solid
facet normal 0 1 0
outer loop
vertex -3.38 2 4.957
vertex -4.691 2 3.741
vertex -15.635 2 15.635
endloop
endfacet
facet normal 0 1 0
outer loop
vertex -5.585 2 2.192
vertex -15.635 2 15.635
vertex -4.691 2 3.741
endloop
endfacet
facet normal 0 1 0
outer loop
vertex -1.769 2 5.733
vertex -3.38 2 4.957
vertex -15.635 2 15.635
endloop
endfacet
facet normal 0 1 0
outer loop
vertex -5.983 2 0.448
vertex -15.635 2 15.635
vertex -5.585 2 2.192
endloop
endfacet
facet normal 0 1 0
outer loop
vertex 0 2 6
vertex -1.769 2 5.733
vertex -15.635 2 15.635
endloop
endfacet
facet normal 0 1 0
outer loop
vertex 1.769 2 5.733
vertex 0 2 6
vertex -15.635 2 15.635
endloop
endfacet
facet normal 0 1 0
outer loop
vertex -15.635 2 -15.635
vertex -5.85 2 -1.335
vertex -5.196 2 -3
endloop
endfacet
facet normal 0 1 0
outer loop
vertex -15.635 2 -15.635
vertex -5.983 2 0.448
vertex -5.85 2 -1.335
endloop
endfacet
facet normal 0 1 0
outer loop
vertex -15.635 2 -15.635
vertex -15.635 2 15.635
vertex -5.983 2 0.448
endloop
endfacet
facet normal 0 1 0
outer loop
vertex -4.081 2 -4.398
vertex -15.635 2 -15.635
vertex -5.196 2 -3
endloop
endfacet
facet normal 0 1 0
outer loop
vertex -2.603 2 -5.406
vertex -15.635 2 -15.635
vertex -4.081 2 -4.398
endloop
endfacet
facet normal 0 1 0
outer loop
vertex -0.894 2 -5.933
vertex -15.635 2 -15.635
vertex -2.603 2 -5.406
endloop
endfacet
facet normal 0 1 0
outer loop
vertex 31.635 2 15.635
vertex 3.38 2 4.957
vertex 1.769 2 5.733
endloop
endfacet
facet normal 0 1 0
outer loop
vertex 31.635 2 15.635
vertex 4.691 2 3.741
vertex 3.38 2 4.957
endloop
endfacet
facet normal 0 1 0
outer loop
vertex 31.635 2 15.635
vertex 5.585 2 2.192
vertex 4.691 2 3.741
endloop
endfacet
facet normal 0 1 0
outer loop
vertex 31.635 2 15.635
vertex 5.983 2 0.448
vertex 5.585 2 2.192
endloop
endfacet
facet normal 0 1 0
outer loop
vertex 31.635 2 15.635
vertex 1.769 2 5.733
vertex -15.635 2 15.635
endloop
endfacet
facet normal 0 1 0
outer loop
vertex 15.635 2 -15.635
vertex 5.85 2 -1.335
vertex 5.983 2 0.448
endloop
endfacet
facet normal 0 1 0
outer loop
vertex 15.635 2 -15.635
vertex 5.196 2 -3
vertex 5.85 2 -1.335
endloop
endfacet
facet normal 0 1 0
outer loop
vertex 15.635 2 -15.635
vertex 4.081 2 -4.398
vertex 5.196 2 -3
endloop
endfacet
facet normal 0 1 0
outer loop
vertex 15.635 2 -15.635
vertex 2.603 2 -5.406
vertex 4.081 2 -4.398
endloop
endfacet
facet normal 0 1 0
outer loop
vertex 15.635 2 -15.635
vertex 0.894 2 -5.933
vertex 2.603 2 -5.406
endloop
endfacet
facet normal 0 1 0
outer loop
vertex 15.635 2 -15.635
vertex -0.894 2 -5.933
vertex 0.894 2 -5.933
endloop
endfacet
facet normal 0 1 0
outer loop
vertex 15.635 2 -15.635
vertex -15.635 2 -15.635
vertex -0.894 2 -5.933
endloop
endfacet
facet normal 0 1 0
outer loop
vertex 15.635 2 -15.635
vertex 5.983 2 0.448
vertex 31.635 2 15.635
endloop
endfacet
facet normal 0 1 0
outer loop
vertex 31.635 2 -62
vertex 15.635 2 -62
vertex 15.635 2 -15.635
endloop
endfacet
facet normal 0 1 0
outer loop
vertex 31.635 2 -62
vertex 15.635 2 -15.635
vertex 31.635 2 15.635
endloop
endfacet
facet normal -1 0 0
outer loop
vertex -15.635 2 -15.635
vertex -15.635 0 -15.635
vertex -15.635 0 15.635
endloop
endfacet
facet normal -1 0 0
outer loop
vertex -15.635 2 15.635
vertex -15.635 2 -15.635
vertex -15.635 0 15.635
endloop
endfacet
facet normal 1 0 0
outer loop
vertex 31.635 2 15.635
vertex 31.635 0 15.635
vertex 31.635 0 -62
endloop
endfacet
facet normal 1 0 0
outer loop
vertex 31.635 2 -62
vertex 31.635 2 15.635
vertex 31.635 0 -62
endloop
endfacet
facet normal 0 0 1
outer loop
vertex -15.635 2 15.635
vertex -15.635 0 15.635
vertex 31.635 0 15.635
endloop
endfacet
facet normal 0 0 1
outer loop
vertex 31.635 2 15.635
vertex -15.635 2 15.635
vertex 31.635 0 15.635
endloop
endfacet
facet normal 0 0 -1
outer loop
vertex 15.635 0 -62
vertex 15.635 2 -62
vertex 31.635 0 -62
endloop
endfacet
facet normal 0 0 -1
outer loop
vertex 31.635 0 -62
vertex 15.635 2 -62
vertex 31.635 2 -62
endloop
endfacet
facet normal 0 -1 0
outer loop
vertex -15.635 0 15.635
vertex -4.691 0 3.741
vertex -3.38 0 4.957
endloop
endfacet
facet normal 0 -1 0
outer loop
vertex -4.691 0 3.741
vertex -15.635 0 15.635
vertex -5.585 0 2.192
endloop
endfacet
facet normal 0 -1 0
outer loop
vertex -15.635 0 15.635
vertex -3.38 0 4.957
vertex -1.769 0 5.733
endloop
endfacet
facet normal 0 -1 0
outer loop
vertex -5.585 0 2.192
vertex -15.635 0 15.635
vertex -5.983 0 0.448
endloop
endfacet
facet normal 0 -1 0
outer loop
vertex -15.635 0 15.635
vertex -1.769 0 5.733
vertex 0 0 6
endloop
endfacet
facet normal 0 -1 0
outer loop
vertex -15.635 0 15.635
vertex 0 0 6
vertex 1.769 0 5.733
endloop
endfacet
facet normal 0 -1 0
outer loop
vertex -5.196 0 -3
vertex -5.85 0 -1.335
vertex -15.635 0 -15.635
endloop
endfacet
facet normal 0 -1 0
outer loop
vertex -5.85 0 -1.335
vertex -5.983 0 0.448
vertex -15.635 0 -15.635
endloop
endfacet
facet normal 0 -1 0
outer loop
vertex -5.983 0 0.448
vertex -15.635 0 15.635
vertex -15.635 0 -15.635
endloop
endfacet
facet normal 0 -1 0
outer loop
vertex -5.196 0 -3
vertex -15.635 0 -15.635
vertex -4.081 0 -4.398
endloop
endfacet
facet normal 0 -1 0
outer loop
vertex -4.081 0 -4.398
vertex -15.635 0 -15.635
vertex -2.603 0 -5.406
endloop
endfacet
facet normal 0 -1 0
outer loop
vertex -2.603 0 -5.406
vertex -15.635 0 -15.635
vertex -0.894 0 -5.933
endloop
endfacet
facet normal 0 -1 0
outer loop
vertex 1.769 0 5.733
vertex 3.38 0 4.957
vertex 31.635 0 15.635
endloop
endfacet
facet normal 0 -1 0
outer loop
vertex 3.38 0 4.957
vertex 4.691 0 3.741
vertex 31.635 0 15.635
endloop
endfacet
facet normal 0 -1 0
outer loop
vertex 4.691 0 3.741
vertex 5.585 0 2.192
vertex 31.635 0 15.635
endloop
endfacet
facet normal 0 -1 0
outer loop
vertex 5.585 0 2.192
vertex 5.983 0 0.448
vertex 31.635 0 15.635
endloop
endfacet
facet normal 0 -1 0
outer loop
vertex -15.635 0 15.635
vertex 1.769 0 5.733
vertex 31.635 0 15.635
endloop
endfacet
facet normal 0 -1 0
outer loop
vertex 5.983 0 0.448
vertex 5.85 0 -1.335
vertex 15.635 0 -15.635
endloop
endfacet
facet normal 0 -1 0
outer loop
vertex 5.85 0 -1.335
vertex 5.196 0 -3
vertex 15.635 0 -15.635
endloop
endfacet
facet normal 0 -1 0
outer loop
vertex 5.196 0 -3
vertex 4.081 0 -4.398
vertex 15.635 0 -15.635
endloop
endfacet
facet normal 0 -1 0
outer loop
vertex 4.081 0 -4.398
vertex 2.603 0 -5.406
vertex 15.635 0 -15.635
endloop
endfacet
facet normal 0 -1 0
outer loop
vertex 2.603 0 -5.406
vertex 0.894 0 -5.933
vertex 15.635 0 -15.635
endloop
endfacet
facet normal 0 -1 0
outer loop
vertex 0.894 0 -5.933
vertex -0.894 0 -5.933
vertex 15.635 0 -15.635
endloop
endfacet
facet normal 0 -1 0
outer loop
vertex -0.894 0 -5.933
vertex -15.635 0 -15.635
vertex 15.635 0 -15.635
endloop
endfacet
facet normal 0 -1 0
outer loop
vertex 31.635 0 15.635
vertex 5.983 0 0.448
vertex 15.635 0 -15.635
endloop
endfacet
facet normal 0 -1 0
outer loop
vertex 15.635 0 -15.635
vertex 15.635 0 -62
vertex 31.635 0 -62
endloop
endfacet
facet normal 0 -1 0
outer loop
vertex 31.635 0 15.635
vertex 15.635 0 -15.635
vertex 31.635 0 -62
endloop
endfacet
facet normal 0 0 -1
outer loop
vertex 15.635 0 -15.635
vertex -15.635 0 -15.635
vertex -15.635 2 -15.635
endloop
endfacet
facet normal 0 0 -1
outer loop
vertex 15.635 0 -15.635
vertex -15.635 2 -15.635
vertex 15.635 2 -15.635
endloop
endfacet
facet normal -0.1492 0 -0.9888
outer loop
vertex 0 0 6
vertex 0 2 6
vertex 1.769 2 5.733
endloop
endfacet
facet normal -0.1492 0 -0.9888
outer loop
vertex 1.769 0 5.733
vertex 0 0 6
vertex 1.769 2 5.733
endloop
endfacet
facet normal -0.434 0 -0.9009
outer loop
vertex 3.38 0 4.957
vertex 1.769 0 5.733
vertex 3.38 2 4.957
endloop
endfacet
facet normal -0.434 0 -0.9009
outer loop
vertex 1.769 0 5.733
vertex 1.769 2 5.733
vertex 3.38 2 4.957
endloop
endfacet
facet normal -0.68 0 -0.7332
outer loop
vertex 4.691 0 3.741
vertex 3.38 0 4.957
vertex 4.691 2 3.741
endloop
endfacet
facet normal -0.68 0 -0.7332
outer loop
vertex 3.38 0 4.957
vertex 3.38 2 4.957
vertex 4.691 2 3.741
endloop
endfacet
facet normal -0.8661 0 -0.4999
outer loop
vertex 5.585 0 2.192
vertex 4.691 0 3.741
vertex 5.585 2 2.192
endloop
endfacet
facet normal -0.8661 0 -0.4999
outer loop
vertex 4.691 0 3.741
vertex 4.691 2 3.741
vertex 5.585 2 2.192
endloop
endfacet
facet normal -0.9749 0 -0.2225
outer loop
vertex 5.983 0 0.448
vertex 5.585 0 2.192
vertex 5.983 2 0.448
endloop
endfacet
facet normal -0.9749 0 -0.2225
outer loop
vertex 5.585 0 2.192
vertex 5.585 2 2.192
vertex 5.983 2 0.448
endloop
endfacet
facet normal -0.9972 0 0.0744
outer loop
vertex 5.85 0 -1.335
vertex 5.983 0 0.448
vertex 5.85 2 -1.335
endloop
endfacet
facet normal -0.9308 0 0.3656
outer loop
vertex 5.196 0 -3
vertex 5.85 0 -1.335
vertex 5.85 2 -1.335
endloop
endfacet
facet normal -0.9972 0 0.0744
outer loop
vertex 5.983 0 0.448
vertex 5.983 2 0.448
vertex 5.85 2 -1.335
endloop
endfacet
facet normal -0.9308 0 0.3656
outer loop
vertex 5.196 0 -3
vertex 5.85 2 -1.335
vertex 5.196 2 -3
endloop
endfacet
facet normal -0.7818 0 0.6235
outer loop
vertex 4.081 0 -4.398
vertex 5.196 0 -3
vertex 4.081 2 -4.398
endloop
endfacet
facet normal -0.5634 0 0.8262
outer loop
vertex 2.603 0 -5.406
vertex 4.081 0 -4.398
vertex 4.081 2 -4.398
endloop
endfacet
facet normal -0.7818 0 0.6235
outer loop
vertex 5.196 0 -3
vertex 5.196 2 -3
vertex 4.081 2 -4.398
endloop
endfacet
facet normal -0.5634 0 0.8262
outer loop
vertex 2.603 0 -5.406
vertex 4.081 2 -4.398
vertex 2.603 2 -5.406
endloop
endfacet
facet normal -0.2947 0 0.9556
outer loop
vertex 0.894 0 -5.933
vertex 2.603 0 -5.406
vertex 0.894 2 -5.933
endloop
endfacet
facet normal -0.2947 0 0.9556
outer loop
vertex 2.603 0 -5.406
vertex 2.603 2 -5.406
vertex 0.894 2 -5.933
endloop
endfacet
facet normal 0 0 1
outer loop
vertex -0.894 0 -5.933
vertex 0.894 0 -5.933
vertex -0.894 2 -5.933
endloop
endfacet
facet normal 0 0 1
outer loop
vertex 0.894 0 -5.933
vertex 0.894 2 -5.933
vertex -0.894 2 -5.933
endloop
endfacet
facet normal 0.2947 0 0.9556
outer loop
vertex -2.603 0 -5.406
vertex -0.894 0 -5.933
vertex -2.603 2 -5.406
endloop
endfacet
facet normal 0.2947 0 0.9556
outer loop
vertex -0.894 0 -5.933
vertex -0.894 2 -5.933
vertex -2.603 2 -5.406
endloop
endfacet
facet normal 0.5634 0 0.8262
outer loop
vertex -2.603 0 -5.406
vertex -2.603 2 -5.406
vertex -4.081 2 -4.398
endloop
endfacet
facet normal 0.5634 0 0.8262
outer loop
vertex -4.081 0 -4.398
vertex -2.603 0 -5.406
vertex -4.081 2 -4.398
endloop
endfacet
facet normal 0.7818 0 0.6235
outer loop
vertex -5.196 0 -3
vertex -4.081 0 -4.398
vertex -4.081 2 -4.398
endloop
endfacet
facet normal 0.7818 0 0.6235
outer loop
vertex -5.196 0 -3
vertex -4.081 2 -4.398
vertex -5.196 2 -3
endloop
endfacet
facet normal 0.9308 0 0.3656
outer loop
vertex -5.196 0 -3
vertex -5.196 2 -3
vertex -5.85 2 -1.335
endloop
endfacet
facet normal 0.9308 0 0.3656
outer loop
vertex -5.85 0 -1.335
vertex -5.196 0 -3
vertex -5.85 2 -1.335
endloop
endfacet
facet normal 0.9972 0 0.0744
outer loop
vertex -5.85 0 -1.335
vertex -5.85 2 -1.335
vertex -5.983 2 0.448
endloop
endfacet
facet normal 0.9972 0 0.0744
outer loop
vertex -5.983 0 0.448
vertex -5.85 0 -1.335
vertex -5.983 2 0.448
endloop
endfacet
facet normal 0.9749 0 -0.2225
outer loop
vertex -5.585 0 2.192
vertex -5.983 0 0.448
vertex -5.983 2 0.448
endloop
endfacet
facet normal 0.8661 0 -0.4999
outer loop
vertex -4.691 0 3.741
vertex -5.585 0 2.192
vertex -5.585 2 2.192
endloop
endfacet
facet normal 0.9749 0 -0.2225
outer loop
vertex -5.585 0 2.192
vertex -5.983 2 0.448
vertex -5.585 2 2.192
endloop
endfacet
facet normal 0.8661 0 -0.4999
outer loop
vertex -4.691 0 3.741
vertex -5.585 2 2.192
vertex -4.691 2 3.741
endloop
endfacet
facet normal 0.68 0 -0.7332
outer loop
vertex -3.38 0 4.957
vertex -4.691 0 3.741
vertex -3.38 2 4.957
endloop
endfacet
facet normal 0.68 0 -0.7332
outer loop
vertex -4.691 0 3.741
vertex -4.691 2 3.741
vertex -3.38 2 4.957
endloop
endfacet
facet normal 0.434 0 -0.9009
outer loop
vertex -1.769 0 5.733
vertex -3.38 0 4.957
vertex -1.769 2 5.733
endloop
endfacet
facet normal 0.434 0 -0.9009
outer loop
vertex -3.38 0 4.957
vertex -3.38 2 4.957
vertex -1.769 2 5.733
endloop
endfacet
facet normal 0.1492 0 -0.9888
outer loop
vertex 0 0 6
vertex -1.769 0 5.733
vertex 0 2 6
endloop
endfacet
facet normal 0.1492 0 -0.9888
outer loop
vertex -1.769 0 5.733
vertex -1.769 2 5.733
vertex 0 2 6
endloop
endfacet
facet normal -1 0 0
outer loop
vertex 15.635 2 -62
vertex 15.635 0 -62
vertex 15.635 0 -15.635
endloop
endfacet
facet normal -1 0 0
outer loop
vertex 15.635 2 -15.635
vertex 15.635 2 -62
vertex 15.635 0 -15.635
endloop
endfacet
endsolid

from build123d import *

# Parameters (mm, degrees)
SKETCH1_W           = 63.27
SKETCH1_H           = 63.27
BOSS_EXTRUDE1_DEPTH = 2
SKETCH2_R           = 6
CUT_EXTRUDE1_DEPTH  = 2
SKETCH3_W           = 16
SKETCH3_H           = 62
BOSS_EXTRUDE2_DEPTH = 2
SKETCH4_W           = 16
SKETCH4_H           = 63.27
CUT_EXTRUDE2_DEPTH  = 10
SKETCH5_W           = 47.27
SKETCH5_H           = 16
CUT_EXTRUDE3_DEPTH  = 10
SKETCH6_W           = 31.27
SKETCH6_H           = 16
CUT_EXTRUDE4_DEPTH  = 10


with BuildPart() as part:
    # Sketch1 → Boss-Extrude1 (new body)
    with BuildSketch(Plane(origin=(0, 0, 0), x_dir=(1, 0, 0), z_dir=(0, 1, 0))):
        Rectangle(SKETCH1_W, SKETCH1_H)
    extrude(amount=BOSS_EXTRUDE1_DEPTH)

    # Sketch2 → Cut-Extrude1 (cut)
    with BuildSketch(Plane(origin=(0, 2, 0), x_dir=(1, 0, 0), z_dir=(0, 1, 0))):
        with Locations(Location((0, 0, 0), (0, 0, 270))):
            Circle(SKETCH2_R)
    extrude(amount=-CUT_EXTRUDE1_DEPTH, mode=Mode.SUBTRACT)

    # Sketch3 → Boss-Extrude2 (add)
    with BuildSketch(Plane(origin=(0, 2, 0), x_dir=(1, 0, 0), z_dir=(0, 1, 0))):
        with Locations((23.635, 31)):
            Rectangle(SKETCH3_W, SKETCH3_H)
    extrude(amount=-BOSS_EXTRUDE2_DEPTH)

    # Sketch4 → Cut-Extrude2 (cut)
    with BuildSketch(Plane.XZ):
        with Locations((-23.635, 0)):
            Rectangle(SKETCH4_W, SKETCH4_H)
    extrude(amount=-CUT_EXTRUDE2_DEPTH, mode=Mode.SUBTRACT)

    # Sketch5 → Cut-Extrude3 (cut)
    with BuildSketch(Plane.XZ):
        with Locations((8, 23.635)):
            Rectangle(SKETCH5_W, SKETCH5_H)
    extrude(amount=-CUT_EXTRUDE3_DEPTH, mode=Mode.SUBTRACT)

    # Sketch6 → Cut-Extrude4 (cut)
    with BuildSketch(Plane.XZ):
        with Locations((0, -23.635)):
            Rectangle(SKETCH6_W, SKETCH6_H)
    extrude(amount=-CUT_EXTRUDE4_DEPTH, mode=Mode.SUBTRACT)


solid = part.part
